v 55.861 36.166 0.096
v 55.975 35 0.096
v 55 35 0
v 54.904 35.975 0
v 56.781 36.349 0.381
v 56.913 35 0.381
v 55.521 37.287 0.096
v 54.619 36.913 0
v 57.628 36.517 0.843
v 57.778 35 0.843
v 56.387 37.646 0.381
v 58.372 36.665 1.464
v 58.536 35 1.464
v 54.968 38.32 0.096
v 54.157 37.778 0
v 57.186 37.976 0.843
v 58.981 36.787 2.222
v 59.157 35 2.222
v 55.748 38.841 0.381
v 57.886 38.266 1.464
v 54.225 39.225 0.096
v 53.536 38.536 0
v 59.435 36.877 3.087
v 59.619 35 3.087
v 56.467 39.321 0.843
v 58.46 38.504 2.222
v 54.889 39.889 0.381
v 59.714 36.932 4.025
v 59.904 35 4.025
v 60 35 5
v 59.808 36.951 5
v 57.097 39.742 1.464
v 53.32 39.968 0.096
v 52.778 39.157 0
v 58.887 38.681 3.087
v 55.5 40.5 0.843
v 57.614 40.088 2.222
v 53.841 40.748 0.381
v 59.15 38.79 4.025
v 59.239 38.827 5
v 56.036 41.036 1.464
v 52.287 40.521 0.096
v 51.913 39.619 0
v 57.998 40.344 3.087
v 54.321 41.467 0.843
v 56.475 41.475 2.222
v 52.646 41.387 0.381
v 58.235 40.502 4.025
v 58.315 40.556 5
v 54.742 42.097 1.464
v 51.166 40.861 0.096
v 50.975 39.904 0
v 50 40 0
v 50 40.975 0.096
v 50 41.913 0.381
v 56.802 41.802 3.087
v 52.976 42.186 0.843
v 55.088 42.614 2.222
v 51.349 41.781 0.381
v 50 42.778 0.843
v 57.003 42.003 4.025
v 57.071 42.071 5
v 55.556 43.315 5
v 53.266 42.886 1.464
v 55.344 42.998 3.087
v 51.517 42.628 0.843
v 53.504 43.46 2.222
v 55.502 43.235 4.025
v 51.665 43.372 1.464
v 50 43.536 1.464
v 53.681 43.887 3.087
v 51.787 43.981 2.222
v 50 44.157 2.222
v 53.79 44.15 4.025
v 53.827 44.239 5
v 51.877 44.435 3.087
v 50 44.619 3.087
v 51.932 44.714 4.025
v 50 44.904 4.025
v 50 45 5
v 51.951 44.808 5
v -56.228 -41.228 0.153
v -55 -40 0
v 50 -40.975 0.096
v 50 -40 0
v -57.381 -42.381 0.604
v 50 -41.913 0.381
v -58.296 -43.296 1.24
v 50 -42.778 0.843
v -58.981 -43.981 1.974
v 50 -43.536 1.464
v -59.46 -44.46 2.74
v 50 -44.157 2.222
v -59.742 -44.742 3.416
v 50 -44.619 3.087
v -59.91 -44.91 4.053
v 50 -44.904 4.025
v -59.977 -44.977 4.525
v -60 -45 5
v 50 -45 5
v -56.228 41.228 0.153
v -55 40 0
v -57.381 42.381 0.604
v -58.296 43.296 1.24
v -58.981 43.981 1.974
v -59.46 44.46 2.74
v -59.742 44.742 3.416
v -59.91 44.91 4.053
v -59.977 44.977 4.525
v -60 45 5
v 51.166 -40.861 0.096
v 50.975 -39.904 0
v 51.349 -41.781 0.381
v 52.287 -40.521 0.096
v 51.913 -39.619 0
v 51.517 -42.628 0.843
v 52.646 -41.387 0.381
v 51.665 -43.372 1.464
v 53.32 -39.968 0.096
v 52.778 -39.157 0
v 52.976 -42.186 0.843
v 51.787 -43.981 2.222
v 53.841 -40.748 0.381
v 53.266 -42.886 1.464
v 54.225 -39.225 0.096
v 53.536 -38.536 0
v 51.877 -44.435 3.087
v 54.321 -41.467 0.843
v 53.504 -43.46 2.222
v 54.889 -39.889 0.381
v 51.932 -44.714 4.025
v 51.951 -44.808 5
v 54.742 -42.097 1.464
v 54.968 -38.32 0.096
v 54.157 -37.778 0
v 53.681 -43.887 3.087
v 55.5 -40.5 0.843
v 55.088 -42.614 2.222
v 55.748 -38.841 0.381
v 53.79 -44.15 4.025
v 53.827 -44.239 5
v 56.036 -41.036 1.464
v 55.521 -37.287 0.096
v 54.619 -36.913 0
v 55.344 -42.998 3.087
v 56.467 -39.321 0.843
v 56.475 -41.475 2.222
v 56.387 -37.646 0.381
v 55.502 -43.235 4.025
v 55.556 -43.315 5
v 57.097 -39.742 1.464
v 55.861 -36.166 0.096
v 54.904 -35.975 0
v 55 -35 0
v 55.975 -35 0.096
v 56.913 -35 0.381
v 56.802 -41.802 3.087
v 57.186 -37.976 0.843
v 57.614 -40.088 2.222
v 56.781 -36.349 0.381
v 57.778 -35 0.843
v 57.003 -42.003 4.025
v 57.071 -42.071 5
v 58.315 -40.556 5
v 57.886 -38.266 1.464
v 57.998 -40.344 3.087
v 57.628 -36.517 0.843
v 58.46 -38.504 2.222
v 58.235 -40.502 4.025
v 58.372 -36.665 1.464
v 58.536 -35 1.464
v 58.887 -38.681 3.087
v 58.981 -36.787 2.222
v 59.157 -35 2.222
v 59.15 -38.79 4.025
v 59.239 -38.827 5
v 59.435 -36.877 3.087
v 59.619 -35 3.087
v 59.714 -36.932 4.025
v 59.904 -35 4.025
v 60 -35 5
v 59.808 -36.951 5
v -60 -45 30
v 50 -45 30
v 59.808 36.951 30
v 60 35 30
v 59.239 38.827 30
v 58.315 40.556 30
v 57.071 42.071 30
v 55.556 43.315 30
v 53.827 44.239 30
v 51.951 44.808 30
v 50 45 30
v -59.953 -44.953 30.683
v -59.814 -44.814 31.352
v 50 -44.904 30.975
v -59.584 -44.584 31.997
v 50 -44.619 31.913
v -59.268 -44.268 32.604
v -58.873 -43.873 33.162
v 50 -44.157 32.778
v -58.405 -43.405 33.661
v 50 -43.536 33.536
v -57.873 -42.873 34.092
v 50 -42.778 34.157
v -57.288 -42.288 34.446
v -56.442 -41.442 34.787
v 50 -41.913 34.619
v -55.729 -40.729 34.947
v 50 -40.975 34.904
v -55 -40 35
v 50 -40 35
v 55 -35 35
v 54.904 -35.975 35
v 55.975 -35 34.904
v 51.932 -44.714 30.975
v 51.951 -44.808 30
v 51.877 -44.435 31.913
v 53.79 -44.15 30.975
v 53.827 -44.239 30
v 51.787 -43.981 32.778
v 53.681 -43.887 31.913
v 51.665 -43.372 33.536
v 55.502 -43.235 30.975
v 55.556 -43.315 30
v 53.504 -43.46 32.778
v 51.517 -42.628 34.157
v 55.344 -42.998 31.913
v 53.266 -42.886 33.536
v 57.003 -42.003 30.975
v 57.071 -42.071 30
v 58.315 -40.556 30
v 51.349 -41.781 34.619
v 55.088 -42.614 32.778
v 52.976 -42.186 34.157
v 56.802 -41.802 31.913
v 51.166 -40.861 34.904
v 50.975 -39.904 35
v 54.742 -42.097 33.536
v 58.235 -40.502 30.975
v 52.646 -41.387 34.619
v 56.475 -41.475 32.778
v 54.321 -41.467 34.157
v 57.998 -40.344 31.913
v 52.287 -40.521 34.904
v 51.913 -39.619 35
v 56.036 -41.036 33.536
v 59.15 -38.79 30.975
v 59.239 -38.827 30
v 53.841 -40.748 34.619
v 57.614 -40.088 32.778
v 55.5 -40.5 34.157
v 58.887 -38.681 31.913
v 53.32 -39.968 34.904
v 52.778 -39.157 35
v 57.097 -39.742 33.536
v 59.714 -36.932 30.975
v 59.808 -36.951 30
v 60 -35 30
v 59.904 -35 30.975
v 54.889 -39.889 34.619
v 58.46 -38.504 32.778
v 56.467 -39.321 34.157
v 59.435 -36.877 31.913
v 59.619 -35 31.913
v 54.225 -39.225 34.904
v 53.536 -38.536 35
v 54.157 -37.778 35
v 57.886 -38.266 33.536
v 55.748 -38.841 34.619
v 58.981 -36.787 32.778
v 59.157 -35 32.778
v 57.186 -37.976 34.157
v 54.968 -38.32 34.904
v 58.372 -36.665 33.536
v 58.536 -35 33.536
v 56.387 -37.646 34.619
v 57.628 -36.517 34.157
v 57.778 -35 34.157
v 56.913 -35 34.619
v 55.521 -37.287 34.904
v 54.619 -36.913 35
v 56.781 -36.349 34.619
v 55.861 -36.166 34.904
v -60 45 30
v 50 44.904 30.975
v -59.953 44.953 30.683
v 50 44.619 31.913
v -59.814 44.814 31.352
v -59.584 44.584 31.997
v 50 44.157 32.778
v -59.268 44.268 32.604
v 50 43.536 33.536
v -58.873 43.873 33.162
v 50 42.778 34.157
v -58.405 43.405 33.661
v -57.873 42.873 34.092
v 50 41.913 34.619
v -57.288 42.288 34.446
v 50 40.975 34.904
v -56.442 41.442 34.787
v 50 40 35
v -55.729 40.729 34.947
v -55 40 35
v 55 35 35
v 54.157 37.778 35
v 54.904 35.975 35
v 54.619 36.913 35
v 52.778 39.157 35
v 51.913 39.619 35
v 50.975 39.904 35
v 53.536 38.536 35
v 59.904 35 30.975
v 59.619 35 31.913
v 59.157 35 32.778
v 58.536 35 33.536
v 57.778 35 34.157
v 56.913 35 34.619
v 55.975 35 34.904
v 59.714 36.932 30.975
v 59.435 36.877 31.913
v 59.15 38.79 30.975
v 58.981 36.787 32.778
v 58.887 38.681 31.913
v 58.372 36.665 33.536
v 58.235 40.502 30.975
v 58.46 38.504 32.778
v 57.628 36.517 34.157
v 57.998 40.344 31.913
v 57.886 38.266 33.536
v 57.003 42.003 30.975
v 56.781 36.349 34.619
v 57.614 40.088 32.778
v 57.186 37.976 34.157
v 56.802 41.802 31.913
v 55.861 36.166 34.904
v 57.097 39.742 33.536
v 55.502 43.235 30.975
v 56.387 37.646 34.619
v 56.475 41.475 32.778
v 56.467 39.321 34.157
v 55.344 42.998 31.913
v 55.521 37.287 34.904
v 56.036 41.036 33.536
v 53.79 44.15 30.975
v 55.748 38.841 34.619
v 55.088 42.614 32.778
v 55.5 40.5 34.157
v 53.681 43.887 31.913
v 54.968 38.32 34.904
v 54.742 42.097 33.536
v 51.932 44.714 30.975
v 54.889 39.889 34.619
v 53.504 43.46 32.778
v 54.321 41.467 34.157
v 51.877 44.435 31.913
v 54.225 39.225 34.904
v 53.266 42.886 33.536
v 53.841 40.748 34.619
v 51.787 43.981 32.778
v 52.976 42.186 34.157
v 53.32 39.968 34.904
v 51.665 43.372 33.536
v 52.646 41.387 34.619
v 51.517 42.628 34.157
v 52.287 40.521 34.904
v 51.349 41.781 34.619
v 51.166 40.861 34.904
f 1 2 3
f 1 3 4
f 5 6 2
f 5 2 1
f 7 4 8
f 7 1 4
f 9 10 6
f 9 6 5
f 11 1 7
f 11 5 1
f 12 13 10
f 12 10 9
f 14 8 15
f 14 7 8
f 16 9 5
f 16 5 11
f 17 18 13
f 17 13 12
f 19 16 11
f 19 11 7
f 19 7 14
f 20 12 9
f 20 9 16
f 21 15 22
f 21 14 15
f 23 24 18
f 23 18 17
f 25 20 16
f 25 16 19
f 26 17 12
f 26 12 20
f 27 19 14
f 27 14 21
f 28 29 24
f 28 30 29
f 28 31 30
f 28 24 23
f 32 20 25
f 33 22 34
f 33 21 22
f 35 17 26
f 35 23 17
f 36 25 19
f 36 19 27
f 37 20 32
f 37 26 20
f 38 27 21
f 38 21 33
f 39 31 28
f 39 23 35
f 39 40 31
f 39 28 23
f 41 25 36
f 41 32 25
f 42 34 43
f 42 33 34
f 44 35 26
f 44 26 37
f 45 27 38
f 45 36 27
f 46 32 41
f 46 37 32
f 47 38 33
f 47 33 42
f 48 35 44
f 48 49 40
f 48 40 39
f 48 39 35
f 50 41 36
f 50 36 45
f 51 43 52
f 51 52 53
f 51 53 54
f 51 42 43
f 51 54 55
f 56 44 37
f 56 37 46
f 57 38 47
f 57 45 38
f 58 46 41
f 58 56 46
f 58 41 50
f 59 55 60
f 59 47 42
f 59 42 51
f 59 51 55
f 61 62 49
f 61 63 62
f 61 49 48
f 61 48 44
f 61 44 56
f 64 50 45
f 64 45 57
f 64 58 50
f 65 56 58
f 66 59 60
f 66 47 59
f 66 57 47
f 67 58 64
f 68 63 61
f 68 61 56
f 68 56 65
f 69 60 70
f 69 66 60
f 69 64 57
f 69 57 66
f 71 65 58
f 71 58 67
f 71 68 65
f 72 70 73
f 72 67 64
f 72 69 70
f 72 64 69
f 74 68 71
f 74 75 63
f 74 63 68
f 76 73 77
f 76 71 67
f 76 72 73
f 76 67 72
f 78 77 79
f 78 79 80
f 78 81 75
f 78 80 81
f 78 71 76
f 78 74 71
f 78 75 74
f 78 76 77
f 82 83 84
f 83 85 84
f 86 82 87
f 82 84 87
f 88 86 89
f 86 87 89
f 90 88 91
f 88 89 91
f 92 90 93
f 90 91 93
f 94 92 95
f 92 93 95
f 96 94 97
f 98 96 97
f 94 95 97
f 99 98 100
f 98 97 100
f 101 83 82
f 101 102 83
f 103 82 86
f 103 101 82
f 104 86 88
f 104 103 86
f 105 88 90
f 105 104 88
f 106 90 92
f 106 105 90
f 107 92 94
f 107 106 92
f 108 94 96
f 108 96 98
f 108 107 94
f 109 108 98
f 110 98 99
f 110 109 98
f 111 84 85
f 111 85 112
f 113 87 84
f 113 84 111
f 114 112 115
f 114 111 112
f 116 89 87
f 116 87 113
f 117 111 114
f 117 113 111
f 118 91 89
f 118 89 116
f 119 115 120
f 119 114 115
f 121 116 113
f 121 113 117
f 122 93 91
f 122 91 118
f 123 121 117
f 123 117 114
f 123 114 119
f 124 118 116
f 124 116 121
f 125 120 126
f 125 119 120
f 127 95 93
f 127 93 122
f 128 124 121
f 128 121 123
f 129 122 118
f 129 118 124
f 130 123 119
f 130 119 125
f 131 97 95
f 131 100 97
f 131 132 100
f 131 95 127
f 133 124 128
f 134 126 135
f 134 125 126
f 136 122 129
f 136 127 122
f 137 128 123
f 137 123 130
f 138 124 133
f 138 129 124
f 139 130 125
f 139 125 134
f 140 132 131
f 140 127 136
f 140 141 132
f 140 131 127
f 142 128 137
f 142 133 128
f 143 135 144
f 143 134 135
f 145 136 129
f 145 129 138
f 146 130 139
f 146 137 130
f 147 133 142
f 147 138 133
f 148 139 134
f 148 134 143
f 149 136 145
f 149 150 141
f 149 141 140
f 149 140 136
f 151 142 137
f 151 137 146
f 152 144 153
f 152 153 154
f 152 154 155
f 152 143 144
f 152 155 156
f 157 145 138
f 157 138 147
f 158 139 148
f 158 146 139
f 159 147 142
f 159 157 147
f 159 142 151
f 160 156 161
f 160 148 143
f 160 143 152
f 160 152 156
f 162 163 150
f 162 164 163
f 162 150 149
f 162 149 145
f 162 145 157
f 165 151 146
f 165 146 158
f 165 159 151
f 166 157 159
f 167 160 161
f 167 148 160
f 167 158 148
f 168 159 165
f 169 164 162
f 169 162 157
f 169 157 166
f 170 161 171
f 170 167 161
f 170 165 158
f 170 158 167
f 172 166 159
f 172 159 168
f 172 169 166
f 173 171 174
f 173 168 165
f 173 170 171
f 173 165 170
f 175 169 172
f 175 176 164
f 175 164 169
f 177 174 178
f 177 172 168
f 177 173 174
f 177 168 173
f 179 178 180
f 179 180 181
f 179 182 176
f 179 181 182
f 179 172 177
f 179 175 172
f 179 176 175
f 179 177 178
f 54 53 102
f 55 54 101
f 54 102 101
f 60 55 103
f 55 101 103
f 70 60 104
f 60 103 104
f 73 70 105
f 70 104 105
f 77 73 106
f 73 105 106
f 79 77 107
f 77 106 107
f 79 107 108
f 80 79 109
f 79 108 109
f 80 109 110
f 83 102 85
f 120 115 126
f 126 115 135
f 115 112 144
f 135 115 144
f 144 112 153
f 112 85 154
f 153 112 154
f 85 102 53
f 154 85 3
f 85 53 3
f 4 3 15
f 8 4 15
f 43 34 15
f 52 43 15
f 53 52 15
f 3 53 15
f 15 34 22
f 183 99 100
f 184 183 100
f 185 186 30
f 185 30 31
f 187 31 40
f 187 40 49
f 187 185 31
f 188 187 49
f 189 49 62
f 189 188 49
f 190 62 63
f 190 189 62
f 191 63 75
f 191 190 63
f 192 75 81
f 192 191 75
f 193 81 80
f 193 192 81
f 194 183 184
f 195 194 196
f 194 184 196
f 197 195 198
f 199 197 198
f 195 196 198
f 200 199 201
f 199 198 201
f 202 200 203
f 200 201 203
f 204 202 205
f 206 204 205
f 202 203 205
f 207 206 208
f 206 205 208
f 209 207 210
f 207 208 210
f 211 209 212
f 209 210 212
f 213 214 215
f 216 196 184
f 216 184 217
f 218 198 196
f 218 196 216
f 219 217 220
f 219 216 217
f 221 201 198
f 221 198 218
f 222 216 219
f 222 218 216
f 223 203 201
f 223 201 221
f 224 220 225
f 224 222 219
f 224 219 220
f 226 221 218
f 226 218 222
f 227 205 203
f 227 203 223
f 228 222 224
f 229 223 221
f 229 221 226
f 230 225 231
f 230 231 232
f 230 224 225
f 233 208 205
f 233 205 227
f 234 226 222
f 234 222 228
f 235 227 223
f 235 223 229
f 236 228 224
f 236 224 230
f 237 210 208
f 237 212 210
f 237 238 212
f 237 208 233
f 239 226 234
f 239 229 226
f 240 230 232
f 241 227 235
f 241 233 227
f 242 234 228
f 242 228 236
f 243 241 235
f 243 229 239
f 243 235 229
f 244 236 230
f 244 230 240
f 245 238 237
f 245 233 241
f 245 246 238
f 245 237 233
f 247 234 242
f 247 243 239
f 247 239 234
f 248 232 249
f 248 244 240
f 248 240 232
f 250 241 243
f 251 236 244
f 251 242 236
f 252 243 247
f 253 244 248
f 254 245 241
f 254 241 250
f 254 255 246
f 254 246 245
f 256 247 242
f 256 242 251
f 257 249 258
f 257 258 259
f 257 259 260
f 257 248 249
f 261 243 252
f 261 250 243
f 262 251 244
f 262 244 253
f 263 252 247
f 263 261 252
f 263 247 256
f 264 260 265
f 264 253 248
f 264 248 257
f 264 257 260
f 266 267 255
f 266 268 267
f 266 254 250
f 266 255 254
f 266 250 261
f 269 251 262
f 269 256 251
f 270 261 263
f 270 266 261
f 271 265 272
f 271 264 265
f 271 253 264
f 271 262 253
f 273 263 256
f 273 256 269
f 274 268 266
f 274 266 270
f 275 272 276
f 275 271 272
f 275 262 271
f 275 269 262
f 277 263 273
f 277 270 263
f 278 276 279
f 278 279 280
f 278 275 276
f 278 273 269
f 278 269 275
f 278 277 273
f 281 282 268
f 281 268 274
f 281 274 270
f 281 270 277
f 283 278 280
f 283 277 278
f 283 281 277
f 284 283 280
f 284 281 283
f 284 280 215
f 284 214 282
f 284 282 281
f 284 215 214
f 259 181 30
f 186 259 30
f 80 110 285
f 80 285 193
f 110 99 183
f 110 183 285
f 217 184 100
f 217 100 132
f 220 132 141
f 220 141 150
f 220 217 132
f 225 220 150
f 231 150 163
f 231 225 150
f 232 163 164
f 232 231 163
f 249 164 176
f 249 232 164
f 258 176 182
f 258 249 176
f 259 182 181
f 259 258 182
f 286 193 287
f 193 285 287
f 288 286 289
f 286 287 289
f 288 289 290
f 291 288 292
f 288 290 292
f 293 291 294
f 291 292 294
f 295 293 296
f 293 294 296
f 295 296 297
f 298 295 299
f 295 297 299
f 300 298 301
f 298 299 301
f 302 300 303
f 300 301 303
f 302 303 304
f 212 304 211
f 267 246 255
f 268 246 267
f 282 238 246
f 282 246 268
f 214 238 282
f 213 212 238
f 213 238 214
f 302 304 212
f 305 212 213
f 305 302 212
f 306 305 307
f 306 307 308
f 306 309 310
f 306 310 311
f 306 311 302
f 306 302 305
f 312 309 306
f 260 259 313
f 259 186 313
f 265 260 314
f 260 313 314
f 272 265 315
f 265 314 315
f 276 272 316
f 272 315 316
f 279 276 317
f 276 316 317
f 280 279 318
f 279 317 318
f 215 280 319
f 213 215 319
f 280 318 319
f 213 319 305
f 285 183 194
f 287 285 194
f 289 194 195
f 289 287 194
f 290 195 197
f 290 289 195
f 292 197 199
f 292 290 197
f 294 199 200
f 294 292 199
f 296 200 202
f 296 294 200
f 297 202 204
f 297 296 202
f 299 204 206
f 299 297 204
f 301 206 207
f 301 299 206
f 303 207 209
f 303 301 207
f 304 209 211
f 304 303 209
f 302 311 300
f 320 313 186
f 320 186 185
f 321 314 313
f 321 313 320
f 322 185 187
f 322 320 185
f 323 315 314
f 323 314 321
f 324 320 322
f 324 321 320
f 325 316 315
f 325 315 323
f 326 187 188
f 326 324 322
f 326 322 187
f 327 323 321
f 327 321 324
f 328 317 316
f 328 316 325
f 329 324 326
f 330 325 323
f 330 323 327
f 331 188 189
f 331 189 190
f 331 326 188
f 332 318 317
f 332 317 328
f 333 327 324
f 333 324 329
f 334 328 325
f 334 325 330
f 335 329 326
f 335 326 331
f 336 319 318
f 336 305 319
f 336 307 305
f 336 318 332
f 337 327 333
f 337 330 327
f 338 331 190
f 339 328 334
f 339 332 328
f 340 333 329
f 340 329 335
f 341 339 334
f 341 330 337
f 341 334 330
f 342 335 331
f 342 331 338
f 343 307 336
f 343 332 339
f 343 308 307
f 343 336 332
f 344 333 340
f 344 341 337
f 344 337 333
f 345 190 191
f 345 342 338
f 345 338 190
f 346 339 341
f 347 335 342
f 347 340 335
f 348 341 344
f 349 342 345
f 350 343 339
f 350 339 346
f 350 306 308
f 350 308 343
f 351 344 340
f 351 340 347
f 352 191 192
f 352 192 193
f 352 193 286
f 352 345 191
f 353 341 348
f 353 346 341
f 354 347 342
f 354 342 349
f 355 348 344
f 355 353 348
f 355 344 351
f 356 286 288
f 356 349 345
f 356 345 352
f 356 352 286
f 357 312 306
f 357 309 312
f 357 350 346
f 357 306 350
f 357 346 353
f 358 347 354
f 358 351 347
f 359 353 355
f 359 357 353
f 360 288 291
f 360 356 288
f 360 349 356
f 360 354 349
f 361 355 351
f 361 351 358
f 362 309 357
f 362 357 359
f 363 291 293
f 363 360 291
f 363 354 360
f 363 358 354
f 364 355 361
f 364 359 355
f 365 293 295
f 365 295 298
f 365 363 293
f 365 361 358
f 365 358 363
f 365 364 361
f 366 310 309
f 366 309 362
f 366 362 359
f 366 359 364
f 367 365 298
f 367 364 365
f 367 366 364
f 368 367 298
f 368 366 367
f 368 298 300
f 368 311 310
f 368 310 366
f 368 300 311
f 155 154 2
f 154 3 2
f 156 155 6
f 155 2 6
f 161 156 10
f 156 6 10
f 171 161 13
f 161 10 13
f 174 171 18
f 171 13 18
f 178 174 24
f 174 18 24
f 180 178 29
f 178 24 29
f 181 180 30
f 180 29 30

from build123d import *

# Parameters (mm, degrees)
SKETCH1_W           = 120
SKETCH1_H           = 90
BOSS_EXTRUDE1_DEPTH = 35
FILLET1_R           = 10
FILLET2_R           = 5


with BuildPart() as part:
    # Sketch1 → Boss-Extrude1 (new body)
    with BuildSketch(Plane.XY):
        Rectangle(SKETCH1_W, SKETCH1_H)
    extrude(amount=BOSS_EXTRUDE1_DEPTH)

    # Fillet1
    fillet1_edges = [part.edges().sort_by_distance(p)[0] for p in [
        (60, -45, 17.5),
        (60, 45, 17.5),
    ]]
    fillet(fillet1_edges, radius=FILLET1_R)

    # Fillet2
    fillet2_edges = [part.edges().sort_by_distance(p)[0] for p in [
        (-60, 0, 35),
        (-5, -45, 35),
        (60, 0, 0),
        (60, 0, 35),
        (-5, 45, 0),
        (57.071067812, 42.071067812, 0),
        (57.071067812, -42.071067812, 0),
        (-5, 45, 35),
        (57.071067812, 42.071067812, 35),
        (57.071067812, -42.071067812, 35),
        (-5, -45, 0),
        (-60, 0, 0),
    ]]
    fillet(fillet2_edges, radius=FILLET2_R)


solid = part.part
